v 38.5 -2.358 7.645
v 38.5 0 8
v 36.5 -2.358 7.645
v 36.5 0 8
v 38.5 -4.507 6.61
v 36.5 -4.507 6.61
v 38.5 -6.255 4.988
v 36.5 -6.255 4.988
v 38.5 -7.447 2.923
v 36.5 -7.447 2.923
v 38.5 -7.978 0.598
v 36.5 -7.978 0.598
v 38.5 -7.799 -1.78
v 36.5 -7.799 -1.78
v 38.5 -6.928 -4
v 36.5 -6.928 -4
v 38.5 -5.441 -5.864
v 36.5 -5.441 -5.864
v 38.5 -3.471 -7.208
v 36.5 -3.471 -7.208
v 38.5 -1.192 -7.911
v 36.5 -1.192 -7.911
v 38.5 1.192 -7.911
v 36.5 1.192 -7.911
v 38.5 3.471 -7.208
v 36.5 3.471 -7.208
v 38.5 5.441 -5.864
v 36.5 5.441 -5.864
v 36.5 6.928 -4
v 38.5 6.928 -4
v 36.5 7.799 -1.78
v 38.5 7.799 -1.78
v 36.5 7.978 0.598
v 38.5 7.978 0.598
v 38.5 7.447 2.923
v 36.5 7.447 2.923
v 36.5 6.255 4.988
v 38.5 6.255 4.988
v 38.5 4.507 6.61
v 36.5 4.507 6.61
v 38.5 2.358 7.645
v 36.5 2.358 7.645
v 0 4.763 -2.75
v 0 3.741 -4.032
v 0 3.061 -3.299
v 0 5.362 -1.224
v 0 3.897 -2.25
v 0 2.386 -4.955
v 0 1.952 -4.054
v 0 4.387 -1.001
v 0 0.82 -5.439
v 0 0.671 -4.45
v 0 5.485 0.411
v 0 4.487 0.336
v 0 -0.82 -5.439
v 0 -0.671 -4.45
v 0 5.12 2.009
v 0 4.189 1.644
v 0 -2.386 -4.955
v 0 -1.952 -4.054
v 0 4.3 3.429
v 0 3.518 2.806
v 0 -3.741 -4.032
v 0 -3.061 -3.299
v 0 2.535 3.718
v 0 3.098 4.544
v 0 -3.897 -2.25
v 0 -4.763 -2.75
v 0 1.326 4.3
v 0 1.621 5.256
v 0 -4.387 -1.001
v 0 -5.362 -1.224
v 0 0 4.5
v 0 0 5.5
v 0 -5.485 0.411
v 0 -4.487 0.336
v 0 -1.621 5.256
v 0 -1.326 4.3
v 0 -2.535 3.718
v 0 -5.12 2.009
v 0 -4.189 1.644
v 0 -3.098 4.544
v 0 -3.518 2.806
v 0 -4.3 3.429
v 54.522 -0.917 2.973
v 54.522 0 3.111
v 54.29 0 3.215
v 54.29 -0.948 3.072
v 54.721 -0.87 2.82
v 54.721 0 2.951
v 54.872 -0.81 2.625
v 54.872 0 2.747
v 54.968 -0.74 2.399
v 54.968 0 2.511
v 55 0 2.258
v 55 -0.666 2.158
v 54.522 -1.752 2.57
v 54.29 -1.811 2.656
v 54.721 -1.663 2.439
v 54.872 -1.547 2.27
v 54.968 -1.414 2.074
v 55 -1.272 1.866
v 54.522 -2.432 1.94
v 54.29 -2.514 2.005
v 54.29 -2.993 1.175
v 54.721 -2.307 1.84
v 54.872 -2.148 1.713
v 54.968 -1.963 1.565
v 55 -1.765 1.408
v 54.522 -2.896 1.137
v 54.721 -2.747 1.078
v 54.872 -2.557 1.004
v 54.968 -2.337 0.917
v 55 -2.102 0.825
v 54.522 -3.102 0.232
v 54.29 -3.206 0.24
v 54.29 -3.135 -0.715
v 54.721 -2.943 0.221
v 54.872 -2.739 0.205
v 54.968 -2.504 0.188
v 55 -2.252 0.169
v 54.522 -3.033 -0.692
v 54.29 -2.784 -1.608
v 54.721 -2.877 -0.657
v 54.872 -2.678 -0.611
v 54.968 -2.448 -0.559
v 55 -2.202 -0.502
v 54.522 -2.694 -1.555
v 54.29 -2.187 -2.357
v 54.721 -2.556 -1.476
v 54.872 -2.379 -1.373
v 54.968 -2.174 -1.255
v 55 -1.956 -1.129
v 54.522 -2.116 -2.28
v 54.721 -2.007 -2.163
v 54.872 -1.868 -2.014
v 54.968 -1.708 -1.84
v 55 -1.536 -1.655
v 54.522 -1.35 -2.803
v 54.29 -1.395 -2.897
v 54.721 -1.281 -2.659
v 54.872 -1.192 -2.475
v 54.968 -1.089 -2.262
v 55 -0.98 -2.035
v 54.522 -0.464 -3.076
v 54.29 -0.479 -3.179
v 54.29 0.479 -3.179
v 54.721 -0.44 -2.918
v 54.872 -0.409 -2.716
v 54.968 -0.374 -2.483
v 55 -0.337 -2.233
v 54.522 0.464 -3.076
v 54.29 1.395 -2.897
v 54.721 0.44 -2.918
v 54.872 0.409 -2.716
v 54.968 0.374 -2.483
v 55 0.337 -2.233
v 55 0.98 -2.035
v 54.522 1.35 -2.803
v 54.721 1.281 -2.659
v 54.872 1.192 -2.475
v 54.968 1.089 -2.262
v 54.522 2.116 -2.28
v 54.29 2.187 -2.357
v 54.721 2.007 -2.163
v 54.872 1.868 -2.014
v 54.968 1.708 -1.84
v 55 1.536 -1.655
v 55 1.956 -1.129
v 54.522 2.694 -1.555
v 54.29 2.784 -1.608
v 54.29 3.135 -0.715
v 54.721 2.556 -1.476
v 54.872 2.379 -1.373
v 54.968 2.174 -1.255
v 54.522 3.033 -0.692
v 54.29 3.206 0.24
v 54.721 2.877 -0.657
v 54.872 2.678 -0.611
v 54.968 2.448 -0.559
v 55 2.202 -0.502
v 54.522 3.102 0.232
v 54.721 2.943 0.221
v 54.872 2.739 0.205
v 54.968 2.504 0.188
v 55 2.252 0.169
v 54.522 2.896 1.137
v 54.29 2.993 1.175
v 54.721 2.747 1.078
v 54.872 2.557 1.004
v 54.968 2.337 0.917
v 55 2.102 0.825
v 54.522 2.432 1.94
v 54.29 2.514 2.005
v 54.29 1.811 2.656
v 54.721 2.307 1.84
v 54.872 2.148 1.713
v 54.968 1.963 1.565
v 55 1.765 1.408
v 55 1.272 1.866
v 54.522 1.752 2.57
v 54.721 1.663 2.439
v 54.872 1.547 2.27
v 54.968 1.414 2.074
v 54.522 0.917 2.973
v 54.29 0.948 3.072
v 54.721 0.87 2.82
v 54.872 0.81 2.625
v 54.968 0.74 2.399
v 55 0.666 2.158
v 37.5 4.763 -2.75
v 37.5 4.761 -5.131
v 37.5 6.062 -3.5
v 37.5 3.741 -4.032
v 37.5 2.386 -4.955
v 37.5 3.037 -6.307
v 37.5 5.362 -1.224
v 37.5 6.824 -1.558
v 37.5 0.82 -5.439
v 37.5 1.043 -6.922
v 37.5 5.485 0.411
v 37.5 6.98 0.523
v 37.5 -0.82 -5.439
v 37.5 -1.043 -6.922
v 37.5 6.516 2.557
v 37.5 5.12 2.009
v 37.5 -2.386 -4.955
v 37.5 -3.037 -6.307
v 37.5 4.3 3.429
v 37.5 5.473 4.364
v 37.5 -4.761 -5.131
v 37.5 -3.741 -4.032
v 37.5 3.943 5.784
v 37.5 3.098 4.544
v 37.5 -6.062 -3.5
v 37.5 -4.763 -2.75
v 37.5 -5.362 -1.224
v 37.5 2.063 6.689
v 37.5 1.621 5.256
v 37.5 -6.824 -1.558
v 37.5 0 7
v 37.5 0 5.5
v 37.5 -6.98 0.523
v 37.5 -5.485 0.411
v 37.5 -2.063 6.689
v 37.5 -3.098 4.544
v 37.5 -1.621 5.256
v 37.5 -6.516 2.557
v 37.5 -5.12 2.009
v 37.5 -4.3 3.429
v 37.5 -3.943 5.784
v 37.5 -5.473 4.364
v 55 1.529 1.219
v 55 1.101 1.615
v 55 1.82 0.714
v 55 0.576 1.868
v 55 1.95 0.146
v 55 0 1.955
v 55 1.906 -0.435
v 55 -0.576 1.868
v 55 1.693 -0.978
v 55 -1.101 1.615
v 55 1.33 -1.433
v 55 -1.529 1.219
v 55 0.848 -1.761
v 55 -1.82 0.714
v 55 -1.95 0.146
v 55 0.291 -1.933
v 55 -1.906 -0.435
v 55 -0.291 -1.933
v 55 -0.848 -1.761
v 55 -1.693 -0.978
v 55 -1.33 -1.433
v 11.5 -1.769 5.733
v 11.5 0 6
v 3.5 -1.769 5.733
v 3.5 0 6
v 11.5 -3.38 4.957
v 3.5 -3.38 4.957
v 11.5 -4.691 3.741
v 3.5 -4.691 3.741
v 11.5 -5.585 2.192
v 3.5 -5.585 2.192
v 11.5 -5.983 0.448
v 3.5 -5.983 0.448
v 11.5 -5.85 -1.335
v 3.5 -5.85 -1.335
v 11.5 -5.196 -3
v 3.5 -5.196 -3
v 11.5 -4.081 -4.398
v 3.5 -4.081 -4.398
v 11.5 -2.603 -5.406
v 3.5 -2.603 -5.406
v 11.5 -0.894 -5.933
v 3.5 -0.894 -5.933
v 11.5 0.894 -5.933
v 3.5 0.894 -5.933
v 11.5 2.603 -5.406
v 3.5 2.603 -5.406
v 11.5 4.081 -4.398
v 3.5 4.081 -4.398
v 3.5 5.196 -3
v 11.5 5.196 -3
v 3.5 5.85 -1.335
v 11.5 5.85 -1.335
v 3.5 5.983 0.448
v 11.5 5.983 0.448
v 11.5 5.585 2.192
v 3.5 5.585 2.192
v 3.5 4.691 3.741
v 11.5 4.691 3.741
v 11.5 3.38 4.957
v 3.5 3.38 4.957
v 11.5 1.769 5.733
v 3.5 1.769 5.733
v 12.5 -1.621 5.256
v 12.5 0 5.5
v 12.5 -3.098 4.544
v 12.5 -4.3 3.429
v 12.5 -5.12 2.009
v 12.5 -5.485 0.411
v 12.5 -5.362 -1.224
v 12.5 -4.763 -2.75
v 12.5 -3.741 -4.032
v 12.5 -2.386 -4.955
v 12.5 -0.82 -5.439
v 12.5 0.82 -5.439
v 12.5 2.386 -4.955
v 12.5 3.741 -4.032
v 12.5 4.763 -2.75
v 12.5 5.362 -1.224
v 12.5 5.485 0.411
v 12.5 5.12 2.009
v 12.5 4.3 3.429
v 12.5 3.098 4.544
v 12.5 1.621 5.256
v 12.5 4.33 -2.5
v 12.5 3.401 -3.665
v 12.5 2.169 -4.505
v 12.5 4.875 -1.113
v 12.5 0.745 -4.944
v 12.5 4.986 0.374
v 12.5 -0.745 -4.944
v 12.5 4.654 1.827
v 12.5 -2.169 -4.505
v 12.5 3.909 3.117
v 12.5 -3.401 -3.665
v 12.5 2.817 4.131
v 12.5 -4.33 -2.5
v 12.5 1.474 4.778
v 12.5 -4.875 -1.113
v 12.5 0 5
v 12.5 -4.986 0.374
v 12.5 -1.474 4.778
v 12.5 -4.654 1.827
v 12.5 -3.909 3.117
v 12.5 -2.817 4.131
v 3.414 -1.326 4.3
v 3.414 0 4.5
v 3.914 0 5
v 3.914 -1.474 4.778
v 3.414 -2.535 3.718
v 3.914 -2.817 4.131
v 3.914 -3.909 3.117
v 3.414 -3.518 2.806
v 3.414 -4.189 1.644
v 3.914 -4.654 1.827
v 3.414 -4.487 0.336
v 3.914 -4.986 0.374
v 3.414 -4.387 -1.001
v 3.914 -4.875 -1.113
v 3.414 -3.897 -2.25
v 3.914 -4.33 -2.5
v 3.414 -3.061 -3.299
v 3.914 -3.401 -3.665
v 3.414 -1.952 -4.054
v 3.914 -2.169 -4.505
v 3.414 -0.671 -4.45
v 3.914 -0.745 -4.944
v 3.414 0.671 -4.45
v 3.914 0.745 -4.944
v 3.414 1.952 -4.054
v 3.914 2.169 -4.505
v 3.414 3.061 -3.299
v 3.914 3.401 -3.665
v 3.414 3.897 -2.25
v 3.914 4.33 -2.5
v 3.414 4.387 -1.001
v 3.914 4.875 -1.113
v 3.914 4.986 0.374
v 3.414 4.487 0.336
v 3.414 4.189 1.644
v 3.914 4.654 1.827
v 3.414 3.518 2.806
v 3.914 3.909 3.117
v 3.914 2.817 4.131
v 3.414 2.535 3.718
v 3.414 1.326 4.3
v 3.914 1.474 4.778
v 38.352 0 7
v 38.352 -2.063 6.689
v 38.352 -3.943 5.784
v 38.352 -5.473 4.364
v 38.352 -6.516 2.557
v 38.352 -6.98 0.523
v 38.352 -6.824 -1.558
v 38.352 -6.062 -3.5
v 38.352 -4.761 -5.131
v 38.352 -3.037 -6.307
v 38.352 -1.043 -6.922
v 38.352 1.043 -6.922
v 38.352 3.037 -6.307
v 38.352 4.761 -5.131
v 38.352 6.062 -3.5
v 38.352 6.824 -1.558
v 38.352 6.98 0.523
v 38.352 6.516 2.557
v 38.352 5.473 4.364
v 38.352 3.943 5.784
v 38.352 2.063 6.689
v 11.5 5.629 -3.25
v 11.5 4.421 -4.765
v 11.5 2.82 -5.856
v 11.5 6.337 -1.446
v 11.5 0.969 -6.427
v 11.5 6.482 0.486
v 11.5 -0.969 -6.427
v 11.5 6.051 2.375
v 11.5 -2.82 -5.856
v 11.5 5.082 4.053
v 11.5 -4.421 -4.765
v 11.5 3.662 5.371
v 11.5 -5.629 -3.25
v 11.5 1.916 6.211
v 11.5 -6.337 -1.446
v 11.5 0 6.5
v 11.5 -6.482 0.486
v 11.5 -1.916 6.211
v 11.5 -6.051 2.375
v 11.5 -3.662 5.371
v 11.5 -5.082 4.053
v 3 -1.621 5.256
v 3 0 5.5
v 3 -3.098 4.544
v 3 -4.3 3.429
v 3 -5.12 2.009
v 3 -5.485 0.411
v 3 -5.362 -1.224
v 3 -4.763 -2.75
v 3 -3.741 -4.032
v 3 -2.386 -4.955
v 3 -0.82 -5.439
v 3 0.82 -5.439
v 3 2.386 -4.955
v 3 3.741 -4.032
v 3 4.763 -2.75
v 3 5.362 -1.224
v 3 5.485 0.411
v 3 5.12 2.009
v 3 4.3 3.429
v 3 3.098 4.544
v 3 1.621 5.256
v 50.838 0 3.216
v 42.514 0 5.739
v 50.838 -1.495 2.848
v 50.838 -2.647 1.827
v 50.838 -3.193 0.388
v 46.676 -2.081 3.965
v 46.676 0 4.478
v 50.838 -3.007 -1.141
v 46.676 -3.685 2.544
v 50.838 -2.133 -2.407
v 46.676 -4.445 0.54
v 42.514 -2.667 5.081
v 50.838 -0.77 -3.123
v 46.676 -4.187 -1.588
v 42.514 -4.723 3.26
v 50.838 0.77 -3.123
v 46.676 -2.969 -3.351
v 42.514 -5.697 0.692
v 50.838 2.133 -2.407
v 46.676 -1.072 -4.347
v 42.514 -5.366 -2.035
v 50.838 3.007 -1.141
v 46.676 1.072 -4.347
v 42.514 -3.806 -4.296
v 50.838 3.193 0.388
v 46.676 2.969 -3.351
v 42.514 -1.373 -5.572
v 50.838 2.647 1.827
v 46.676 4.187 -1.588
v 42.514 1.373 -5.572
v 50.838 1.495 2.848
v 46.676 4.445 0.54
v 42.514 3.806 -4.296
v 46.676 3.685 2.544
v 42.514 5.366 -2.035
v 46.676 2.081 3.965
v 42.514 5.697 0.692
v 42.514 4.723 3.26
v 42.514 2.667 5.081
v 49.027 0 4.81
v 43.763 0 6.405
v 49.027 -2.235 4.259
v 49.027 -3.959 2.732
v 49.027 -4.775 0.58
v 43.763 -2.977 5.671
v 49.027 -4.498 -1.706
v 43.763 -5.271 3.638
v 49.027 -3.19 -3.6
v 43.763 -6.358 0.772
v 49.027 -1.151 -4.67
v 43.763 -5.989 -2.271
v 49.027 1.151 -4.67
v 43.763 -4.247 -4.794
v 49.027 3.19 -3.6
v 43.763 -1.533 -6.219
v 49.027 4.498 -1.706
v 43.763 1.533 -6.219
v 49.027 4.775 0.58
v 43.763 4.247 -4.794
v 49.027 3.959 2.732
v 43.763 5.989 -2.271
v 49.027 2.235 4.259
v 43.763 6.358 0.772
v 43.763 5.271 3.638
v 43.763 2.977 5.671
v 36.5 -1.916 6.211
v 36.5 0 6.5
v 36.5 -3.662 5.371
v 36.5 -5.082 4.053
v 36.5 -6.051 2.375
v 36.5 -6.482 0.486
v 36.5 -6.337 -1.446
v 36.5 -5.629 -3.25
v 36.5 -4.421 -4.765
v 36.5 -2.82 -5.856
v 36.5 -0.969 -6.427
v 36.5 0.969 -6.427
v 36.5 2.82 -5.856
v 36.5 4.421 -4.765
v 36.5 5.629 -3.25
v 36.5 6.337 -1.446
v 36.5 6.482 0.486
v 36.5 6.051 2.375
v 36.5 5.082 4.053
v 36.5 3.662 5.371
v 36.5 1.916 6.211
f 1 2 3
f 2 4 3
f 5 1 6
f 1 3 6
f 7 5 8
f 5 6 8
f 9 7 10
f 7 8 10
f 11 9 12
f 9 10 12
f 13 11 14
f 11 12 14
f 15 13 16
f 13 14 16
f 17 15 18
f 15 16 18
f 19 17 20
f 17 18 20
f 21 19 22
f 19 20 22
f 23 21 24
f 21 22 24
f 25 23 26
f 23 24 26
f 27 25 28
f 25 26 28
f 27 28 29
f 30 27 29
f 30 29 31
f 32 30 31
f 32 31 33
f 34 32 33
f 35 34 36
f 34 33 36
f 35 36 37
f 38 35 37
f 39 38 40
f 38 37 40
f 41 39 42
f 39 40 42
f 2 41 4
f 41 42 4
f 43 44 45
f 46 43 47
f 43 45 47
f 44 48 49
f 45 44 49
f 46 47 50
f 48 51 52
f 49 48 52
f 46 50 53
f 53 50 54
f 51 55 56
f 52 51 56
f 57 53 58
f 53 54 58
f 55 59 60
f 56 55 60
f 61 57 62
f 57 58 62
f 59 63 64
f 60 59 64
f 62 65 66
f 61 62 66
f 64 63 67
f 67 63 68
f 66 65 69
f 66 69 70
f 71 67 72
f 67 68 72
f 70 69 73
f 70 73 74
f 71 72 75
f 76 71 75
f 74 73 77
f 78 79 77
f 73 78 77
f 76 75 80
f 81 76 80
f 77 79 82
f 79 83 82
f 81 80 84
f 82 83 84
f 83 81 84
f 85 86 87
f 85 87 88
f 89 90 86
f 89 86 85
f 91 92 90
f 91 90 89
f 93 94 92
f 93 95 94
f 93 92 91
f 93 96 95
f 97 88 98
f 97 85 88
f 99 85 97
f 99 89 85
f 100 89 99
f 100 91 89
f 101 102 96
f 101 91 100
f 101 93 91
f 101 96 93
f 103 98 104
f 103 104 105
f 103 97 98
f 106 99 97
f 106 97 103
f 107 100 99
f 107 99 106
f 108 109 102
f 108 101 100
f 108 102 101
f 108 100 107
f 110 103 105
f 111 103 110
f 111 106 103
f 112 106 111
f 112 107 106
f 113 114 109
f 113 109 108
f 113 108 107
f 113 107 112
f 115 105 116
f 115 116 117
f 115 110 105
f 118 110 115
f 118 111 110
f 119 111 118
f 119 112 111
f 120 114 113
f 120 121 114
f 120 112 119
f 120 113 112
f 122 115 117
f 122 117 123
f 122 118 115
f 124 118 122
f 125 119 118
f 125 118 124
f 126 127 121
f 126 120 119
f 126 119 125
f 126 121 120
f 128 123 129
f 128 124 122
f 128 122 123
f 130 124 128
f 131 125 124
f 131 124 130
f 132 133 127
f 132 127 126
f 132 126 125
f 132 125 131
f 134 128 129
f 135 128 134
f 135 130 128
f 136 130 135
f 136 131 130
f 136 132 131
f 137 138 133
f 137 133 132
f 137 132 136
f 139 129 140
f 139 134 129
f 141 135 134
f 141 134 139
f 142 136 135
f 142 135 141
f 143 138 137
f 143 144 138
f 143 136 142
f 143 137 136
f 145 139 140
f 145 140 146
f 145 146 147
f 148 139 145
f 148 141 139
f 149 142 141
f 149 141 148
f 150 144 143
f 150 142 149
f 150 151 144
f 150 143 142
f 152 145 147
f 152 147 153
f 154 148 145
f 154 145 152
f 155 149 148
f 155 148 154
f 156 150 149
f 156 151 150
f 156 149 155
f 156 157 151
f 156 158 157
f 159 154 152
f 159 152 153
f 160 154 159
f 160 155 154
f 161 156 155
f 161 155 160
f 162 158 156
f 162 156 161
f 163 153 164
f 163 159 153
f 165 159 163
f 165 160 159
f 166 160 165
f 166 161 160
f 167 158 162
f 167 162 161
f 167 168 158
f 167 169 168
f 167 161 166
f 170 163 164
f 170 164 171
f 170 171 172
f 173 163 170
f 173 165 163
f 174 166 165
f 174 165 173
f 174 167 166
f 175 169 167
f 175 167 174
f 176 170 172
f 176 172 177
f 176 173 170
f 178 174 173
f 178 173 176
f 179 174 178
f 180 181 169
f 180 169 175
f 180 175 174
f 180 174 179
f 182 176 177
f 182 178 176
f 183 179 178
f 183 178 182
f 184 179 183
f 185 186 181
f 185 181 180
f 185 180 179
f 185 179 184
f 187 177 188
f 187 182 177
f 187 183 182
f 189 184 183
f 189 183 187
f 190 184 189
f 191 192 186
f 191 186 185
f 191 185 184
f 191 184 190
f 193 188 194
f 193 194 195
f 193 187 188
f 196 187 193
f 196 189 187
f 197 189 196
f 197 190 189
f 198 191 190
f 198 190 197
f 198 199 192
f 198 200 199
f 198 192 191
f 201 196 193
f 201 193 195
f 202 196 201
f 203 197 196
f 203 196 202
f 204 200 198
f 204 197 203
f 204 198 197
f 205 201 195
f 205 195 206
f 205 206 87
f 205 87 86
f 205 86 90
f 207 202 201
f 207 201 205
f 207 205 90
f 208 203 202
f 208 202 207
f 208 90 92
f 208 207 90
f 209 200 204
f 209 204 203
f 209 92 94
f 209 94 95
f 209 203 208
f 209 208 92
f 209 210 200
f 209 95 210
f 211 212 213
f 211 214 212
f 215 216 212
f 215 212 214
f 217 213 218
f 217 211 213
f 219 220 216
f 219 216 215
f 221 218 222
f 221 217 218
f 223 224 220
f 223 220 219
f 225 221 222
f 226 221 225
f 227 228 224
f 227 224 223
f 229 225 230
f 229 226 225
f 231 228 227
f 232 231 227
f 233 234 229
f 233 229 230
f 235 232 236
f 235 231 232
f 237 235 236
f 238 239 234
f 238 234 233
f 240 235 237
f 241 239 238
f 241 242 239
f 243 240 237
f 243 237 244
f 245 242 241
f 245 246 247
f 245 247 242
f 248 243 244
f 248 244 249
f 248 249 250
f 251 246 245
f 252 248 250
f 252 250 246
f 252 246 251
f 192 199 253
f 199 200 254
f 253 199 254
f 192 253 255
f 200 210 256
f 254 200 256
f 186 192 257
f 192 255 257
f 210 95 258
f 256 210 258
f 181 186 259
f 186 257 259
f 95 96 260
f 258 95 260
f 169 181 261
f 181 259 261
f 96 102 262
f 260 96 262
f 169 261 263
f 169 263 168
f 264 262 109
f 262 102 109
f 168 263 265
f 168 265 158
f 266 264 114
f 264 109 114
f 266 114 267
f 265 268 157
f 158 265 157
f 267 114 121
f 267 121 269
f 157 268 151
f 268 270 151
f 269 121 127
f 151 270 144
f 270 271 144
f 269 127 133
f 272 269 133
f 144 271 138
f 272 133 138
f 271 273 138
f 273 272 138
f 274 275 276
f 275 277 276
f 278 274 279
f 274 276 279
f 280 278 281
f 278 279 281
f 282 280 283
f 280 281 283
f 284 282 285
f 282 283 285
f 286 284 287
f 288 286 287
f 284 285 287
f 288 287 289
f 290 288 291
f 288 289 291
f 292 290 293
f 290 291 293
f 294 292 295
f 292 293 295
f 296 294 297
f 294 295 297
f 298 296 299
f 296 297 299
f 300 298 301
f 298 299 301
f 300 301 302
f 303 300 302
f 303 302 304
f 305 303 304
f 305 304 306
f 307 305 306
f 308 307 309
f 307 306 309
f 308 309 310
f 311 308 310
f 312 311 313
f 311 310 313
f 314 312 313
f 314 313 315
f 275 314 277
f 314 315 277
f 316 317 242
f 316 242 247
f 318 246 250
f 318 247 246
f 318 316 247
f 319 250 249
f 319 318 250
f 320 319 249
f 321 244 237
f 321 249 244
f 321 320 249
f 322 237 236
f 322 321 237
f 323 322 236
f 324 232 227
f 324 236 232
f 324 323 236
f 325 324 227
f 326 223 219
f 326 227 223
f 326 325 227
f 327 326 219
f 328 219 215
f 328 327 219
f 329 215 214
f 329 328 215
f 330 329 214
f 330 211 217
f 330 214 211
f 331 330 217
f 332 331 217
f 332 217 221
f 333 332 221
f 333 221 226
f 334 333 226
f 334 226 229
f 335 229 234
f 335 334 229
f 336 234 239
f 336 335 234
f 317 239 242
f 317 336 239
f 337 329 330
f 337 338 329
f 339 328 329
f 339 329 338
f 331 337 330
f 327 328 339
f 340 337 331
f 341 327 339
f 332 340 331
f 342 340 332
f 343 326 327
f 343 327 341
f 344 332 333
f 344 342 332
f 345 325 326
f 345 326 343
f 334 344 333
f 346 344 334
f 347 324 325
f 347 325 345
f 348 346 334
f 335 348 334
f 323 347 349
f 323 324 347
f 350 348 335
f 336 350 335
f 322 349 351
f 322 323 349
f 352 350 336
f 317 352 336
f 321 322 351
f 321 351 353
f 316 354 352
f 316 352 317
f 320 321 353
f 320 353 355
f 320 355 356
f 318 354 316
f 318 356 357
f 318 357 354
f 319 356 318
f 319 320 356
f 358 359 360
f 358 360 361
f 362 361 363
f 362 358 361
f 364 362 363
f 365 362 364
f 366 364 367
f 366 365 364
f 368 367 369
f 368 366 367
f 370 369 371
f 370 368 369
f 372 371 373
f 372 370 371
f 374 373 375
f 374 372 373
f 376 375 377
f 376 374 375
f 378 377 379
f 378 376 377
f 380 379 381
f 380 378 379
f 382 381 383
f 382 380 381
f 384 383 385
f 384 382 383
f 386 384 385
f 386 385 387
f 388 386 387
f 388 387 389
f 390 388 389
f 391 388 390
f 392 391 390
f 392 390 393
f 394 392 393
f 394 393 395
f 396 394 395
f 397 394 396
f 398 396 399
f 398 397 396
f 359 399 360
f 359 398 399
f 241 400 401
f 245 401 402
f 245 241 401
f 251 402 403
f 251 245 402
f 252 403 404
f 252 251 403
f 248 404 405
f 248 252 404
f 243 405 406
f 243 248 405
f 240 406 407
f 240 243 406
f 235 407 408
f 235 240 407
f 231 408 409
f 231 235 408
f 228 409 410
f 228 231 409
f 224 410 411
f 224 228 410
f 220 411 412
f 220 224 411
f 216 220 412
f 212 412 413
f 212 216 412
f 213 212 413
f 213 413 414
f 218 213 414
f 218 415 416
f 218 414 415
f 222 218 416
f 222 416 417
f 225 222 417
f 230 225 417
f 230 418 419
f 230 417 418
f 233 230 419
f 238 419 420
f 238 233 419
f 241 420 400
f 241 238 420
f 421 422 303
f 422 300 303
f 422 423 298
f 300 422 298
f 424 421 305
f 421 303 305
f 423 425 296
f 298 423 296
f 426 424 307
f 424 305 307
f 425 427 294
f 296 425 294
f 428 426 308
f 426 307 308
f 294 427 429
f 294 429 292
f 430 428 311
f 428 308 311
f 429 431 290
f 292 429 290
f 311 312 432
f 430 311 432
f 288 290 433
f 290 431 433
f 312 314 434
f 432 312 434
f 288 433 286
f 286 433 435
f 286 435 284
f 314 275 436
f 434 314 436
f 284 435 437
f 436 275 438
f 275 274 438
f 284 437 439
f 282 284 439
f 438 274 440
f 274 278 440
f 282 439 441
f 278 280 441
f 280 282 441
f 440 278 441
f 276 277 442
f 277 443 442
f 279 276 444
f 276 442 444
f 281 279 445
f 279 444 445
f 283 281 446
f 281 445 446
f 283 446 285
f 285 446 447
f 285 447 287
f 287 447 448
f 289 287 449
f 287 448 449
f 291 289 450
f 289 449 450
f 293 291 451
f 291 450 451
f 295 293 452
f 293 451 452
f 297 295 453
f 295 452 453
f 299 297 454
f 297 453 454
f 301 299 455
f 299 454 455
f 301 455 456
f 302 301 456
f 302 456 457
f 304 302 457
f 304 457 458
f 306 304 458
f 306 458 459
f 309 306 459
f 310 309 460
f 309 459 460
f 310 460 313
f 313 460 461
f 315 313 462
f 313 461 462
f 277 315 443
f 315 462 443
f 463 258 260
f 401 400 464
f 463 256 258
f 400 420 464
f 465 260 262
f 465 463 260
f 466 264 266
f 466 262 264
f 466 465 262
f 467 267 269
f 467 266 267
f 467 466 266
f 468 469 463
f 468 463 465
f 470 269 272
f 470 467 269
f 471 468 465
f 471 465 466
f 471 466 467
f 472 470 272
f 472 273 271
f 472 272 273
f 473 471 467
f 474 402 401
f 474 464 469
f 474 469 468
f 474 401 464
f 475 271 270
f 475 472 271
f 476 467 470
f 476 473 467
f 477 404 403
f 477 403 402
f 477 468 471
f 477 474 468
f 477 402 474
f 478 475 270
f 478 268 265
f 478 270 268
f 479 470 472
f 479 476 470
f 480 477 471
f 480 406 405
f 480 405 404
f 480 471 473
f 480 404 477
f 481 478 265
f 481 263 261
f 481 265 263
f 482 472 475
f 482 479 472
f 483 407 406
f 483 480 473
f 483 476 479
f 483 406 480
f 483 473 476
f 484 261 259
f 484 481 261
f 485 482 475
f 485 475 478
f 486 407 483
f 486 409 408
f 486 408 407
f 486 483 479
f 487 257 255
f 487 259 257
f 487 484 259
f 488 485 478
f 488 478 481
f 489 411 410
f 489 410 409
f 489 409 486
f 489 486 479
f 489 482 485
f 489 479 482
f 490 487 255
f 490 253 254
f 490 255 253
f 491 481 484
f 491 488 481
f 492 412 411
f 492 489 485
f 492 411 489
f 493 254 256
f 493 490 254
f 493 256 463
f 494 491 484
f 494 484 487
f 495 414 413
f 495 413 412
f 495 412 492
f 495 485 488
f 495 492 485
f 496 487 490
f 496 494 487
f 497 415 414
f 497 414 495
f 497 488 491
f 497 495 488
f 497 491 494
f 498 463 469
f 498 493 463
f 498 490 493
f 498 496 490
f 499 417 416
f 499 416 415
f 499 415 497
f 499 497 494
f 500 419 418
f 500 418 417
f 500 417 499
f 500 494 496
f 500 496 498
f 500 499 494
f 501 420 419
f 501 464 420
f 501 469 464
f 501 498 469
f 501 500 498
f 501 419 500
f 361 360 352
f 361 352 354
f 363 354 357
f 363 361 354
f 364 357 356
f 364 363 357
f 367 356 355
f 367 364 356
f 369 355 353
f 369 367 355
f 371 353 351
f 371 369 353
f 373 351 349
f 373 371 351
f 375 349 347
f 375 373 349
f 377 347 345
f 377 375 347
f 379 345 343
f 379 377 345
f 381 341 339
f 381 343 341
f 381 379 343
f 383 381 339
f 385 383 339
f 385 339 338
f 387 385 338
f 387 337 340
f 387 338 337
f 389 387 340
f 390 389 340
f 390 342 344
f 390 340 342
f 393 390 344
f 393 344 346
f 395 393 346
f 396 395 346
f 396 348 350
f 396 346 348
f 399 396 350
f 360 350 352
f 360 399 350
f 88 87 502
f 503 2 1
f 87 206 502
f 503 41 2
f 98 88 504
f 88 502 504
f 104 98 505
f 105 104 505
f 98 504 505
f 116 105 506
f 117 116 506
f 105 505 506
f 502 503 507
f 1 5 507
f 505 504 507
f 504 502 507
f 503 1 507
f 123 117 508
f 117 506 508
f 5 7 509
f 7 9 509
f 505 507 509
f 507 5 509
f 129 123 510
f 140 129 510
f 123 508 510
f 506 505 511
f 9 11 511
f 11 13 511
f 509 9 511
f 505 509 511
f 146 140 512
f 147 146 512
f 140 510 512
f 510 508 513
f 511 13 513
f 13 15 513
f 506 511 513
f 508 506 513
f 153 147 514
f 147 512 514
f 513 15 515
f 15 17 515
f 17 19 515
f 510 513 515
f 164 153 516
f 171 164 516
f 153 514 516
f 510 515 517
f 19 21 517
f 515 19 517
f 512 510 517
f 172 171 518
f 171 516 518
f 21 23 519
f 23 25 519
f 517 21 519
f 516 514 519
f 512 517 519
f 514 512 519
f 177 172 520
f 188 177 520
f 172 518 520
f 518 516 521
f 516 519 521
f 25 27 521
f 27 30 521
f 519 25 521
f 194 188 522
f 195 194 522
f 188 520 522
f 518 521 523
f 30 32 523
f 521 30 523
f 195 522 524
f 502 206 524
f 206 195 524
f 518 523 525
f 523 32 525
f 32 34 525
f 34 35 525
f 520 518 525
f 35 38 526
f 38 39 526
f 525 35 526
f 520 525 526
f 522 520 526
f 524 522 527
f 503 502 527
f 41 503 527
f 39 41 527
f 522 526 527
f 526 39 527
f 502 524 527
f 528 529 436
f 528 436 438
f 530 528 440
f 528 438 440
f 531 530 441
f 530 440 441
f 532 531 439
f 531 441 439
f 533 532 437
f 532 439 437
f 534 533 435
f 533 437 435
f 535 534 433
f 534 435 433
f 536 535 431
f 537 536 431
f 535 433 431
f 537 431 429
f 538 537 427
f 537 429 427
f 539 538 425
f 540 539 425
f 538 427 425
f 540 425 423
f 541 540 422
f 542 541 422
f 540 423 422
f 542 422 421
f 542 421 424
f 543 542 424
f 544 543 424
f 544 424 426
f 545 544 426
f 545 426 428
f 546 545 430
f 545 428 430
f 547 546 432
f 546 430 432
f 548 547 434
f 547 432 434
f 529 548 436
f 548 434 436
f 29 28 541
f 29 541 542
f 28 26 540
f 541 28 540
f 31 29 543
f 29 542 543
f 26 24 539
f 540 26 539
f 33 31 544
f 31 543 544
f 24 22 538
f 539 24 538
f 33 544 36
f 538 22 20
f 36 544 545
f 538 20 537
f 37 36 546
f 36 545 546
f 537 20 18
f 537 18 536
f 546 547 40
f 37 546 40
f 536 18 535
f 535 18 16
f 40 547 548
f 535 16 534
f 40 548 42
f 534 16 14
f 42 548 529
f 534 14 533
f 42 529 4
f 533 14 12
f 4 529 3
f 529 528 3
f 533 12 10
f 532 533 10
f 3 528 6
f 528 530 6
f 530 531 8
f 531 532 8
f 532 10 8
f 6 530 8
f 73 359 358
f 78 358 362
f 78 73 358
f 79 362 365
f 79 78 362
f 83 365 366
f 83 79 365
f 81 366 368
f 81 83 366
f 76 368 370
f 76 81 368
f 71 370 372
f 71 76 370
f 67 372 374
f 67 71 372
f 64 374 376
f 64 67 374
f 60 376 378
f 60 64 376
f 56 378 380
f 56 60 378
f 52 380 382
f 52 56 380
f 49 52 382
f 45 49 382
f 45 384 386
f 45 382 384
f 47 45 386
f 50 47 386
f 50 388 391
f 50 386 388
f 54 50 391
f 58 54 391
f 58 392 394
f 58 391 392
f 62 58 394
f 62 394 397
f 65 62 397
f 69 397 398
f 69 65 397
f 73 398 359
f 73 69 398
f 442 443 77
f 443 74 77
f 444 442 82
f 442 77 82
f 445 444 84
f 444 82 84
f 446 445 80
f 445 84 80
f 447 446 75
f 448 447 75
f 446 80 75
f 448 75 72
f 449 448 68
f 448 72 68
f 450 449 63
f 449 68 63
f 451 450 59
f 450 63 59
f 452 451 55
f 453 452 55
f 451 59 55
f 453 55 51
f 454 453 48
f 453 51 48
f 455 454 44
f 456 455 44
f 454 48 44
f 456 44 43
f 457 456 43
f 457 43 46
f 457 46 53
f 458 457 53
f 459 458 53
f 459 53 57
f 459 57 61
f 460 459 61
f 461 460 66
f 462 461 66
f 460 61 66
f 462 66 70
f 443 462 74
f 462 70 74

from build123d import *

# Parameters (mm, degrees)
F2_T = -1
F3_R = 1


with BuildPart() as f4:
    # F0 (on Front) → F4 (revolve)
    with BuildSketch(Plane.XZ):
        Polygon((0, 5.5), (0, 0), (55, 0), (55, 3), (38.5, 8), (36.5, 8), (36.5, 6.5), (11.5, 6.5), (11.5, 6), (3.5, 6), (3, 5.5), align=None)
    revolve(axis=Axis((5.4076574743, 0, 0), (1, 0, 0)))

    # F2
    f2_openings = [f4.faces().sort_by_distance(p)[0] for p in [
        (0, 0, 0),
        (55, 0, 0),
    ]]
    offset(amount=F2_T, openings=f2_openings, kind=Kind.INTERSECTION)

    # F3
    f3_edges = [f4.edges().sort_by_distance(p)[0] for p in [
        (55, 0, -3),
    ]]
    fillet(f3_edges, radius=F3_R)


solid = f4.part
